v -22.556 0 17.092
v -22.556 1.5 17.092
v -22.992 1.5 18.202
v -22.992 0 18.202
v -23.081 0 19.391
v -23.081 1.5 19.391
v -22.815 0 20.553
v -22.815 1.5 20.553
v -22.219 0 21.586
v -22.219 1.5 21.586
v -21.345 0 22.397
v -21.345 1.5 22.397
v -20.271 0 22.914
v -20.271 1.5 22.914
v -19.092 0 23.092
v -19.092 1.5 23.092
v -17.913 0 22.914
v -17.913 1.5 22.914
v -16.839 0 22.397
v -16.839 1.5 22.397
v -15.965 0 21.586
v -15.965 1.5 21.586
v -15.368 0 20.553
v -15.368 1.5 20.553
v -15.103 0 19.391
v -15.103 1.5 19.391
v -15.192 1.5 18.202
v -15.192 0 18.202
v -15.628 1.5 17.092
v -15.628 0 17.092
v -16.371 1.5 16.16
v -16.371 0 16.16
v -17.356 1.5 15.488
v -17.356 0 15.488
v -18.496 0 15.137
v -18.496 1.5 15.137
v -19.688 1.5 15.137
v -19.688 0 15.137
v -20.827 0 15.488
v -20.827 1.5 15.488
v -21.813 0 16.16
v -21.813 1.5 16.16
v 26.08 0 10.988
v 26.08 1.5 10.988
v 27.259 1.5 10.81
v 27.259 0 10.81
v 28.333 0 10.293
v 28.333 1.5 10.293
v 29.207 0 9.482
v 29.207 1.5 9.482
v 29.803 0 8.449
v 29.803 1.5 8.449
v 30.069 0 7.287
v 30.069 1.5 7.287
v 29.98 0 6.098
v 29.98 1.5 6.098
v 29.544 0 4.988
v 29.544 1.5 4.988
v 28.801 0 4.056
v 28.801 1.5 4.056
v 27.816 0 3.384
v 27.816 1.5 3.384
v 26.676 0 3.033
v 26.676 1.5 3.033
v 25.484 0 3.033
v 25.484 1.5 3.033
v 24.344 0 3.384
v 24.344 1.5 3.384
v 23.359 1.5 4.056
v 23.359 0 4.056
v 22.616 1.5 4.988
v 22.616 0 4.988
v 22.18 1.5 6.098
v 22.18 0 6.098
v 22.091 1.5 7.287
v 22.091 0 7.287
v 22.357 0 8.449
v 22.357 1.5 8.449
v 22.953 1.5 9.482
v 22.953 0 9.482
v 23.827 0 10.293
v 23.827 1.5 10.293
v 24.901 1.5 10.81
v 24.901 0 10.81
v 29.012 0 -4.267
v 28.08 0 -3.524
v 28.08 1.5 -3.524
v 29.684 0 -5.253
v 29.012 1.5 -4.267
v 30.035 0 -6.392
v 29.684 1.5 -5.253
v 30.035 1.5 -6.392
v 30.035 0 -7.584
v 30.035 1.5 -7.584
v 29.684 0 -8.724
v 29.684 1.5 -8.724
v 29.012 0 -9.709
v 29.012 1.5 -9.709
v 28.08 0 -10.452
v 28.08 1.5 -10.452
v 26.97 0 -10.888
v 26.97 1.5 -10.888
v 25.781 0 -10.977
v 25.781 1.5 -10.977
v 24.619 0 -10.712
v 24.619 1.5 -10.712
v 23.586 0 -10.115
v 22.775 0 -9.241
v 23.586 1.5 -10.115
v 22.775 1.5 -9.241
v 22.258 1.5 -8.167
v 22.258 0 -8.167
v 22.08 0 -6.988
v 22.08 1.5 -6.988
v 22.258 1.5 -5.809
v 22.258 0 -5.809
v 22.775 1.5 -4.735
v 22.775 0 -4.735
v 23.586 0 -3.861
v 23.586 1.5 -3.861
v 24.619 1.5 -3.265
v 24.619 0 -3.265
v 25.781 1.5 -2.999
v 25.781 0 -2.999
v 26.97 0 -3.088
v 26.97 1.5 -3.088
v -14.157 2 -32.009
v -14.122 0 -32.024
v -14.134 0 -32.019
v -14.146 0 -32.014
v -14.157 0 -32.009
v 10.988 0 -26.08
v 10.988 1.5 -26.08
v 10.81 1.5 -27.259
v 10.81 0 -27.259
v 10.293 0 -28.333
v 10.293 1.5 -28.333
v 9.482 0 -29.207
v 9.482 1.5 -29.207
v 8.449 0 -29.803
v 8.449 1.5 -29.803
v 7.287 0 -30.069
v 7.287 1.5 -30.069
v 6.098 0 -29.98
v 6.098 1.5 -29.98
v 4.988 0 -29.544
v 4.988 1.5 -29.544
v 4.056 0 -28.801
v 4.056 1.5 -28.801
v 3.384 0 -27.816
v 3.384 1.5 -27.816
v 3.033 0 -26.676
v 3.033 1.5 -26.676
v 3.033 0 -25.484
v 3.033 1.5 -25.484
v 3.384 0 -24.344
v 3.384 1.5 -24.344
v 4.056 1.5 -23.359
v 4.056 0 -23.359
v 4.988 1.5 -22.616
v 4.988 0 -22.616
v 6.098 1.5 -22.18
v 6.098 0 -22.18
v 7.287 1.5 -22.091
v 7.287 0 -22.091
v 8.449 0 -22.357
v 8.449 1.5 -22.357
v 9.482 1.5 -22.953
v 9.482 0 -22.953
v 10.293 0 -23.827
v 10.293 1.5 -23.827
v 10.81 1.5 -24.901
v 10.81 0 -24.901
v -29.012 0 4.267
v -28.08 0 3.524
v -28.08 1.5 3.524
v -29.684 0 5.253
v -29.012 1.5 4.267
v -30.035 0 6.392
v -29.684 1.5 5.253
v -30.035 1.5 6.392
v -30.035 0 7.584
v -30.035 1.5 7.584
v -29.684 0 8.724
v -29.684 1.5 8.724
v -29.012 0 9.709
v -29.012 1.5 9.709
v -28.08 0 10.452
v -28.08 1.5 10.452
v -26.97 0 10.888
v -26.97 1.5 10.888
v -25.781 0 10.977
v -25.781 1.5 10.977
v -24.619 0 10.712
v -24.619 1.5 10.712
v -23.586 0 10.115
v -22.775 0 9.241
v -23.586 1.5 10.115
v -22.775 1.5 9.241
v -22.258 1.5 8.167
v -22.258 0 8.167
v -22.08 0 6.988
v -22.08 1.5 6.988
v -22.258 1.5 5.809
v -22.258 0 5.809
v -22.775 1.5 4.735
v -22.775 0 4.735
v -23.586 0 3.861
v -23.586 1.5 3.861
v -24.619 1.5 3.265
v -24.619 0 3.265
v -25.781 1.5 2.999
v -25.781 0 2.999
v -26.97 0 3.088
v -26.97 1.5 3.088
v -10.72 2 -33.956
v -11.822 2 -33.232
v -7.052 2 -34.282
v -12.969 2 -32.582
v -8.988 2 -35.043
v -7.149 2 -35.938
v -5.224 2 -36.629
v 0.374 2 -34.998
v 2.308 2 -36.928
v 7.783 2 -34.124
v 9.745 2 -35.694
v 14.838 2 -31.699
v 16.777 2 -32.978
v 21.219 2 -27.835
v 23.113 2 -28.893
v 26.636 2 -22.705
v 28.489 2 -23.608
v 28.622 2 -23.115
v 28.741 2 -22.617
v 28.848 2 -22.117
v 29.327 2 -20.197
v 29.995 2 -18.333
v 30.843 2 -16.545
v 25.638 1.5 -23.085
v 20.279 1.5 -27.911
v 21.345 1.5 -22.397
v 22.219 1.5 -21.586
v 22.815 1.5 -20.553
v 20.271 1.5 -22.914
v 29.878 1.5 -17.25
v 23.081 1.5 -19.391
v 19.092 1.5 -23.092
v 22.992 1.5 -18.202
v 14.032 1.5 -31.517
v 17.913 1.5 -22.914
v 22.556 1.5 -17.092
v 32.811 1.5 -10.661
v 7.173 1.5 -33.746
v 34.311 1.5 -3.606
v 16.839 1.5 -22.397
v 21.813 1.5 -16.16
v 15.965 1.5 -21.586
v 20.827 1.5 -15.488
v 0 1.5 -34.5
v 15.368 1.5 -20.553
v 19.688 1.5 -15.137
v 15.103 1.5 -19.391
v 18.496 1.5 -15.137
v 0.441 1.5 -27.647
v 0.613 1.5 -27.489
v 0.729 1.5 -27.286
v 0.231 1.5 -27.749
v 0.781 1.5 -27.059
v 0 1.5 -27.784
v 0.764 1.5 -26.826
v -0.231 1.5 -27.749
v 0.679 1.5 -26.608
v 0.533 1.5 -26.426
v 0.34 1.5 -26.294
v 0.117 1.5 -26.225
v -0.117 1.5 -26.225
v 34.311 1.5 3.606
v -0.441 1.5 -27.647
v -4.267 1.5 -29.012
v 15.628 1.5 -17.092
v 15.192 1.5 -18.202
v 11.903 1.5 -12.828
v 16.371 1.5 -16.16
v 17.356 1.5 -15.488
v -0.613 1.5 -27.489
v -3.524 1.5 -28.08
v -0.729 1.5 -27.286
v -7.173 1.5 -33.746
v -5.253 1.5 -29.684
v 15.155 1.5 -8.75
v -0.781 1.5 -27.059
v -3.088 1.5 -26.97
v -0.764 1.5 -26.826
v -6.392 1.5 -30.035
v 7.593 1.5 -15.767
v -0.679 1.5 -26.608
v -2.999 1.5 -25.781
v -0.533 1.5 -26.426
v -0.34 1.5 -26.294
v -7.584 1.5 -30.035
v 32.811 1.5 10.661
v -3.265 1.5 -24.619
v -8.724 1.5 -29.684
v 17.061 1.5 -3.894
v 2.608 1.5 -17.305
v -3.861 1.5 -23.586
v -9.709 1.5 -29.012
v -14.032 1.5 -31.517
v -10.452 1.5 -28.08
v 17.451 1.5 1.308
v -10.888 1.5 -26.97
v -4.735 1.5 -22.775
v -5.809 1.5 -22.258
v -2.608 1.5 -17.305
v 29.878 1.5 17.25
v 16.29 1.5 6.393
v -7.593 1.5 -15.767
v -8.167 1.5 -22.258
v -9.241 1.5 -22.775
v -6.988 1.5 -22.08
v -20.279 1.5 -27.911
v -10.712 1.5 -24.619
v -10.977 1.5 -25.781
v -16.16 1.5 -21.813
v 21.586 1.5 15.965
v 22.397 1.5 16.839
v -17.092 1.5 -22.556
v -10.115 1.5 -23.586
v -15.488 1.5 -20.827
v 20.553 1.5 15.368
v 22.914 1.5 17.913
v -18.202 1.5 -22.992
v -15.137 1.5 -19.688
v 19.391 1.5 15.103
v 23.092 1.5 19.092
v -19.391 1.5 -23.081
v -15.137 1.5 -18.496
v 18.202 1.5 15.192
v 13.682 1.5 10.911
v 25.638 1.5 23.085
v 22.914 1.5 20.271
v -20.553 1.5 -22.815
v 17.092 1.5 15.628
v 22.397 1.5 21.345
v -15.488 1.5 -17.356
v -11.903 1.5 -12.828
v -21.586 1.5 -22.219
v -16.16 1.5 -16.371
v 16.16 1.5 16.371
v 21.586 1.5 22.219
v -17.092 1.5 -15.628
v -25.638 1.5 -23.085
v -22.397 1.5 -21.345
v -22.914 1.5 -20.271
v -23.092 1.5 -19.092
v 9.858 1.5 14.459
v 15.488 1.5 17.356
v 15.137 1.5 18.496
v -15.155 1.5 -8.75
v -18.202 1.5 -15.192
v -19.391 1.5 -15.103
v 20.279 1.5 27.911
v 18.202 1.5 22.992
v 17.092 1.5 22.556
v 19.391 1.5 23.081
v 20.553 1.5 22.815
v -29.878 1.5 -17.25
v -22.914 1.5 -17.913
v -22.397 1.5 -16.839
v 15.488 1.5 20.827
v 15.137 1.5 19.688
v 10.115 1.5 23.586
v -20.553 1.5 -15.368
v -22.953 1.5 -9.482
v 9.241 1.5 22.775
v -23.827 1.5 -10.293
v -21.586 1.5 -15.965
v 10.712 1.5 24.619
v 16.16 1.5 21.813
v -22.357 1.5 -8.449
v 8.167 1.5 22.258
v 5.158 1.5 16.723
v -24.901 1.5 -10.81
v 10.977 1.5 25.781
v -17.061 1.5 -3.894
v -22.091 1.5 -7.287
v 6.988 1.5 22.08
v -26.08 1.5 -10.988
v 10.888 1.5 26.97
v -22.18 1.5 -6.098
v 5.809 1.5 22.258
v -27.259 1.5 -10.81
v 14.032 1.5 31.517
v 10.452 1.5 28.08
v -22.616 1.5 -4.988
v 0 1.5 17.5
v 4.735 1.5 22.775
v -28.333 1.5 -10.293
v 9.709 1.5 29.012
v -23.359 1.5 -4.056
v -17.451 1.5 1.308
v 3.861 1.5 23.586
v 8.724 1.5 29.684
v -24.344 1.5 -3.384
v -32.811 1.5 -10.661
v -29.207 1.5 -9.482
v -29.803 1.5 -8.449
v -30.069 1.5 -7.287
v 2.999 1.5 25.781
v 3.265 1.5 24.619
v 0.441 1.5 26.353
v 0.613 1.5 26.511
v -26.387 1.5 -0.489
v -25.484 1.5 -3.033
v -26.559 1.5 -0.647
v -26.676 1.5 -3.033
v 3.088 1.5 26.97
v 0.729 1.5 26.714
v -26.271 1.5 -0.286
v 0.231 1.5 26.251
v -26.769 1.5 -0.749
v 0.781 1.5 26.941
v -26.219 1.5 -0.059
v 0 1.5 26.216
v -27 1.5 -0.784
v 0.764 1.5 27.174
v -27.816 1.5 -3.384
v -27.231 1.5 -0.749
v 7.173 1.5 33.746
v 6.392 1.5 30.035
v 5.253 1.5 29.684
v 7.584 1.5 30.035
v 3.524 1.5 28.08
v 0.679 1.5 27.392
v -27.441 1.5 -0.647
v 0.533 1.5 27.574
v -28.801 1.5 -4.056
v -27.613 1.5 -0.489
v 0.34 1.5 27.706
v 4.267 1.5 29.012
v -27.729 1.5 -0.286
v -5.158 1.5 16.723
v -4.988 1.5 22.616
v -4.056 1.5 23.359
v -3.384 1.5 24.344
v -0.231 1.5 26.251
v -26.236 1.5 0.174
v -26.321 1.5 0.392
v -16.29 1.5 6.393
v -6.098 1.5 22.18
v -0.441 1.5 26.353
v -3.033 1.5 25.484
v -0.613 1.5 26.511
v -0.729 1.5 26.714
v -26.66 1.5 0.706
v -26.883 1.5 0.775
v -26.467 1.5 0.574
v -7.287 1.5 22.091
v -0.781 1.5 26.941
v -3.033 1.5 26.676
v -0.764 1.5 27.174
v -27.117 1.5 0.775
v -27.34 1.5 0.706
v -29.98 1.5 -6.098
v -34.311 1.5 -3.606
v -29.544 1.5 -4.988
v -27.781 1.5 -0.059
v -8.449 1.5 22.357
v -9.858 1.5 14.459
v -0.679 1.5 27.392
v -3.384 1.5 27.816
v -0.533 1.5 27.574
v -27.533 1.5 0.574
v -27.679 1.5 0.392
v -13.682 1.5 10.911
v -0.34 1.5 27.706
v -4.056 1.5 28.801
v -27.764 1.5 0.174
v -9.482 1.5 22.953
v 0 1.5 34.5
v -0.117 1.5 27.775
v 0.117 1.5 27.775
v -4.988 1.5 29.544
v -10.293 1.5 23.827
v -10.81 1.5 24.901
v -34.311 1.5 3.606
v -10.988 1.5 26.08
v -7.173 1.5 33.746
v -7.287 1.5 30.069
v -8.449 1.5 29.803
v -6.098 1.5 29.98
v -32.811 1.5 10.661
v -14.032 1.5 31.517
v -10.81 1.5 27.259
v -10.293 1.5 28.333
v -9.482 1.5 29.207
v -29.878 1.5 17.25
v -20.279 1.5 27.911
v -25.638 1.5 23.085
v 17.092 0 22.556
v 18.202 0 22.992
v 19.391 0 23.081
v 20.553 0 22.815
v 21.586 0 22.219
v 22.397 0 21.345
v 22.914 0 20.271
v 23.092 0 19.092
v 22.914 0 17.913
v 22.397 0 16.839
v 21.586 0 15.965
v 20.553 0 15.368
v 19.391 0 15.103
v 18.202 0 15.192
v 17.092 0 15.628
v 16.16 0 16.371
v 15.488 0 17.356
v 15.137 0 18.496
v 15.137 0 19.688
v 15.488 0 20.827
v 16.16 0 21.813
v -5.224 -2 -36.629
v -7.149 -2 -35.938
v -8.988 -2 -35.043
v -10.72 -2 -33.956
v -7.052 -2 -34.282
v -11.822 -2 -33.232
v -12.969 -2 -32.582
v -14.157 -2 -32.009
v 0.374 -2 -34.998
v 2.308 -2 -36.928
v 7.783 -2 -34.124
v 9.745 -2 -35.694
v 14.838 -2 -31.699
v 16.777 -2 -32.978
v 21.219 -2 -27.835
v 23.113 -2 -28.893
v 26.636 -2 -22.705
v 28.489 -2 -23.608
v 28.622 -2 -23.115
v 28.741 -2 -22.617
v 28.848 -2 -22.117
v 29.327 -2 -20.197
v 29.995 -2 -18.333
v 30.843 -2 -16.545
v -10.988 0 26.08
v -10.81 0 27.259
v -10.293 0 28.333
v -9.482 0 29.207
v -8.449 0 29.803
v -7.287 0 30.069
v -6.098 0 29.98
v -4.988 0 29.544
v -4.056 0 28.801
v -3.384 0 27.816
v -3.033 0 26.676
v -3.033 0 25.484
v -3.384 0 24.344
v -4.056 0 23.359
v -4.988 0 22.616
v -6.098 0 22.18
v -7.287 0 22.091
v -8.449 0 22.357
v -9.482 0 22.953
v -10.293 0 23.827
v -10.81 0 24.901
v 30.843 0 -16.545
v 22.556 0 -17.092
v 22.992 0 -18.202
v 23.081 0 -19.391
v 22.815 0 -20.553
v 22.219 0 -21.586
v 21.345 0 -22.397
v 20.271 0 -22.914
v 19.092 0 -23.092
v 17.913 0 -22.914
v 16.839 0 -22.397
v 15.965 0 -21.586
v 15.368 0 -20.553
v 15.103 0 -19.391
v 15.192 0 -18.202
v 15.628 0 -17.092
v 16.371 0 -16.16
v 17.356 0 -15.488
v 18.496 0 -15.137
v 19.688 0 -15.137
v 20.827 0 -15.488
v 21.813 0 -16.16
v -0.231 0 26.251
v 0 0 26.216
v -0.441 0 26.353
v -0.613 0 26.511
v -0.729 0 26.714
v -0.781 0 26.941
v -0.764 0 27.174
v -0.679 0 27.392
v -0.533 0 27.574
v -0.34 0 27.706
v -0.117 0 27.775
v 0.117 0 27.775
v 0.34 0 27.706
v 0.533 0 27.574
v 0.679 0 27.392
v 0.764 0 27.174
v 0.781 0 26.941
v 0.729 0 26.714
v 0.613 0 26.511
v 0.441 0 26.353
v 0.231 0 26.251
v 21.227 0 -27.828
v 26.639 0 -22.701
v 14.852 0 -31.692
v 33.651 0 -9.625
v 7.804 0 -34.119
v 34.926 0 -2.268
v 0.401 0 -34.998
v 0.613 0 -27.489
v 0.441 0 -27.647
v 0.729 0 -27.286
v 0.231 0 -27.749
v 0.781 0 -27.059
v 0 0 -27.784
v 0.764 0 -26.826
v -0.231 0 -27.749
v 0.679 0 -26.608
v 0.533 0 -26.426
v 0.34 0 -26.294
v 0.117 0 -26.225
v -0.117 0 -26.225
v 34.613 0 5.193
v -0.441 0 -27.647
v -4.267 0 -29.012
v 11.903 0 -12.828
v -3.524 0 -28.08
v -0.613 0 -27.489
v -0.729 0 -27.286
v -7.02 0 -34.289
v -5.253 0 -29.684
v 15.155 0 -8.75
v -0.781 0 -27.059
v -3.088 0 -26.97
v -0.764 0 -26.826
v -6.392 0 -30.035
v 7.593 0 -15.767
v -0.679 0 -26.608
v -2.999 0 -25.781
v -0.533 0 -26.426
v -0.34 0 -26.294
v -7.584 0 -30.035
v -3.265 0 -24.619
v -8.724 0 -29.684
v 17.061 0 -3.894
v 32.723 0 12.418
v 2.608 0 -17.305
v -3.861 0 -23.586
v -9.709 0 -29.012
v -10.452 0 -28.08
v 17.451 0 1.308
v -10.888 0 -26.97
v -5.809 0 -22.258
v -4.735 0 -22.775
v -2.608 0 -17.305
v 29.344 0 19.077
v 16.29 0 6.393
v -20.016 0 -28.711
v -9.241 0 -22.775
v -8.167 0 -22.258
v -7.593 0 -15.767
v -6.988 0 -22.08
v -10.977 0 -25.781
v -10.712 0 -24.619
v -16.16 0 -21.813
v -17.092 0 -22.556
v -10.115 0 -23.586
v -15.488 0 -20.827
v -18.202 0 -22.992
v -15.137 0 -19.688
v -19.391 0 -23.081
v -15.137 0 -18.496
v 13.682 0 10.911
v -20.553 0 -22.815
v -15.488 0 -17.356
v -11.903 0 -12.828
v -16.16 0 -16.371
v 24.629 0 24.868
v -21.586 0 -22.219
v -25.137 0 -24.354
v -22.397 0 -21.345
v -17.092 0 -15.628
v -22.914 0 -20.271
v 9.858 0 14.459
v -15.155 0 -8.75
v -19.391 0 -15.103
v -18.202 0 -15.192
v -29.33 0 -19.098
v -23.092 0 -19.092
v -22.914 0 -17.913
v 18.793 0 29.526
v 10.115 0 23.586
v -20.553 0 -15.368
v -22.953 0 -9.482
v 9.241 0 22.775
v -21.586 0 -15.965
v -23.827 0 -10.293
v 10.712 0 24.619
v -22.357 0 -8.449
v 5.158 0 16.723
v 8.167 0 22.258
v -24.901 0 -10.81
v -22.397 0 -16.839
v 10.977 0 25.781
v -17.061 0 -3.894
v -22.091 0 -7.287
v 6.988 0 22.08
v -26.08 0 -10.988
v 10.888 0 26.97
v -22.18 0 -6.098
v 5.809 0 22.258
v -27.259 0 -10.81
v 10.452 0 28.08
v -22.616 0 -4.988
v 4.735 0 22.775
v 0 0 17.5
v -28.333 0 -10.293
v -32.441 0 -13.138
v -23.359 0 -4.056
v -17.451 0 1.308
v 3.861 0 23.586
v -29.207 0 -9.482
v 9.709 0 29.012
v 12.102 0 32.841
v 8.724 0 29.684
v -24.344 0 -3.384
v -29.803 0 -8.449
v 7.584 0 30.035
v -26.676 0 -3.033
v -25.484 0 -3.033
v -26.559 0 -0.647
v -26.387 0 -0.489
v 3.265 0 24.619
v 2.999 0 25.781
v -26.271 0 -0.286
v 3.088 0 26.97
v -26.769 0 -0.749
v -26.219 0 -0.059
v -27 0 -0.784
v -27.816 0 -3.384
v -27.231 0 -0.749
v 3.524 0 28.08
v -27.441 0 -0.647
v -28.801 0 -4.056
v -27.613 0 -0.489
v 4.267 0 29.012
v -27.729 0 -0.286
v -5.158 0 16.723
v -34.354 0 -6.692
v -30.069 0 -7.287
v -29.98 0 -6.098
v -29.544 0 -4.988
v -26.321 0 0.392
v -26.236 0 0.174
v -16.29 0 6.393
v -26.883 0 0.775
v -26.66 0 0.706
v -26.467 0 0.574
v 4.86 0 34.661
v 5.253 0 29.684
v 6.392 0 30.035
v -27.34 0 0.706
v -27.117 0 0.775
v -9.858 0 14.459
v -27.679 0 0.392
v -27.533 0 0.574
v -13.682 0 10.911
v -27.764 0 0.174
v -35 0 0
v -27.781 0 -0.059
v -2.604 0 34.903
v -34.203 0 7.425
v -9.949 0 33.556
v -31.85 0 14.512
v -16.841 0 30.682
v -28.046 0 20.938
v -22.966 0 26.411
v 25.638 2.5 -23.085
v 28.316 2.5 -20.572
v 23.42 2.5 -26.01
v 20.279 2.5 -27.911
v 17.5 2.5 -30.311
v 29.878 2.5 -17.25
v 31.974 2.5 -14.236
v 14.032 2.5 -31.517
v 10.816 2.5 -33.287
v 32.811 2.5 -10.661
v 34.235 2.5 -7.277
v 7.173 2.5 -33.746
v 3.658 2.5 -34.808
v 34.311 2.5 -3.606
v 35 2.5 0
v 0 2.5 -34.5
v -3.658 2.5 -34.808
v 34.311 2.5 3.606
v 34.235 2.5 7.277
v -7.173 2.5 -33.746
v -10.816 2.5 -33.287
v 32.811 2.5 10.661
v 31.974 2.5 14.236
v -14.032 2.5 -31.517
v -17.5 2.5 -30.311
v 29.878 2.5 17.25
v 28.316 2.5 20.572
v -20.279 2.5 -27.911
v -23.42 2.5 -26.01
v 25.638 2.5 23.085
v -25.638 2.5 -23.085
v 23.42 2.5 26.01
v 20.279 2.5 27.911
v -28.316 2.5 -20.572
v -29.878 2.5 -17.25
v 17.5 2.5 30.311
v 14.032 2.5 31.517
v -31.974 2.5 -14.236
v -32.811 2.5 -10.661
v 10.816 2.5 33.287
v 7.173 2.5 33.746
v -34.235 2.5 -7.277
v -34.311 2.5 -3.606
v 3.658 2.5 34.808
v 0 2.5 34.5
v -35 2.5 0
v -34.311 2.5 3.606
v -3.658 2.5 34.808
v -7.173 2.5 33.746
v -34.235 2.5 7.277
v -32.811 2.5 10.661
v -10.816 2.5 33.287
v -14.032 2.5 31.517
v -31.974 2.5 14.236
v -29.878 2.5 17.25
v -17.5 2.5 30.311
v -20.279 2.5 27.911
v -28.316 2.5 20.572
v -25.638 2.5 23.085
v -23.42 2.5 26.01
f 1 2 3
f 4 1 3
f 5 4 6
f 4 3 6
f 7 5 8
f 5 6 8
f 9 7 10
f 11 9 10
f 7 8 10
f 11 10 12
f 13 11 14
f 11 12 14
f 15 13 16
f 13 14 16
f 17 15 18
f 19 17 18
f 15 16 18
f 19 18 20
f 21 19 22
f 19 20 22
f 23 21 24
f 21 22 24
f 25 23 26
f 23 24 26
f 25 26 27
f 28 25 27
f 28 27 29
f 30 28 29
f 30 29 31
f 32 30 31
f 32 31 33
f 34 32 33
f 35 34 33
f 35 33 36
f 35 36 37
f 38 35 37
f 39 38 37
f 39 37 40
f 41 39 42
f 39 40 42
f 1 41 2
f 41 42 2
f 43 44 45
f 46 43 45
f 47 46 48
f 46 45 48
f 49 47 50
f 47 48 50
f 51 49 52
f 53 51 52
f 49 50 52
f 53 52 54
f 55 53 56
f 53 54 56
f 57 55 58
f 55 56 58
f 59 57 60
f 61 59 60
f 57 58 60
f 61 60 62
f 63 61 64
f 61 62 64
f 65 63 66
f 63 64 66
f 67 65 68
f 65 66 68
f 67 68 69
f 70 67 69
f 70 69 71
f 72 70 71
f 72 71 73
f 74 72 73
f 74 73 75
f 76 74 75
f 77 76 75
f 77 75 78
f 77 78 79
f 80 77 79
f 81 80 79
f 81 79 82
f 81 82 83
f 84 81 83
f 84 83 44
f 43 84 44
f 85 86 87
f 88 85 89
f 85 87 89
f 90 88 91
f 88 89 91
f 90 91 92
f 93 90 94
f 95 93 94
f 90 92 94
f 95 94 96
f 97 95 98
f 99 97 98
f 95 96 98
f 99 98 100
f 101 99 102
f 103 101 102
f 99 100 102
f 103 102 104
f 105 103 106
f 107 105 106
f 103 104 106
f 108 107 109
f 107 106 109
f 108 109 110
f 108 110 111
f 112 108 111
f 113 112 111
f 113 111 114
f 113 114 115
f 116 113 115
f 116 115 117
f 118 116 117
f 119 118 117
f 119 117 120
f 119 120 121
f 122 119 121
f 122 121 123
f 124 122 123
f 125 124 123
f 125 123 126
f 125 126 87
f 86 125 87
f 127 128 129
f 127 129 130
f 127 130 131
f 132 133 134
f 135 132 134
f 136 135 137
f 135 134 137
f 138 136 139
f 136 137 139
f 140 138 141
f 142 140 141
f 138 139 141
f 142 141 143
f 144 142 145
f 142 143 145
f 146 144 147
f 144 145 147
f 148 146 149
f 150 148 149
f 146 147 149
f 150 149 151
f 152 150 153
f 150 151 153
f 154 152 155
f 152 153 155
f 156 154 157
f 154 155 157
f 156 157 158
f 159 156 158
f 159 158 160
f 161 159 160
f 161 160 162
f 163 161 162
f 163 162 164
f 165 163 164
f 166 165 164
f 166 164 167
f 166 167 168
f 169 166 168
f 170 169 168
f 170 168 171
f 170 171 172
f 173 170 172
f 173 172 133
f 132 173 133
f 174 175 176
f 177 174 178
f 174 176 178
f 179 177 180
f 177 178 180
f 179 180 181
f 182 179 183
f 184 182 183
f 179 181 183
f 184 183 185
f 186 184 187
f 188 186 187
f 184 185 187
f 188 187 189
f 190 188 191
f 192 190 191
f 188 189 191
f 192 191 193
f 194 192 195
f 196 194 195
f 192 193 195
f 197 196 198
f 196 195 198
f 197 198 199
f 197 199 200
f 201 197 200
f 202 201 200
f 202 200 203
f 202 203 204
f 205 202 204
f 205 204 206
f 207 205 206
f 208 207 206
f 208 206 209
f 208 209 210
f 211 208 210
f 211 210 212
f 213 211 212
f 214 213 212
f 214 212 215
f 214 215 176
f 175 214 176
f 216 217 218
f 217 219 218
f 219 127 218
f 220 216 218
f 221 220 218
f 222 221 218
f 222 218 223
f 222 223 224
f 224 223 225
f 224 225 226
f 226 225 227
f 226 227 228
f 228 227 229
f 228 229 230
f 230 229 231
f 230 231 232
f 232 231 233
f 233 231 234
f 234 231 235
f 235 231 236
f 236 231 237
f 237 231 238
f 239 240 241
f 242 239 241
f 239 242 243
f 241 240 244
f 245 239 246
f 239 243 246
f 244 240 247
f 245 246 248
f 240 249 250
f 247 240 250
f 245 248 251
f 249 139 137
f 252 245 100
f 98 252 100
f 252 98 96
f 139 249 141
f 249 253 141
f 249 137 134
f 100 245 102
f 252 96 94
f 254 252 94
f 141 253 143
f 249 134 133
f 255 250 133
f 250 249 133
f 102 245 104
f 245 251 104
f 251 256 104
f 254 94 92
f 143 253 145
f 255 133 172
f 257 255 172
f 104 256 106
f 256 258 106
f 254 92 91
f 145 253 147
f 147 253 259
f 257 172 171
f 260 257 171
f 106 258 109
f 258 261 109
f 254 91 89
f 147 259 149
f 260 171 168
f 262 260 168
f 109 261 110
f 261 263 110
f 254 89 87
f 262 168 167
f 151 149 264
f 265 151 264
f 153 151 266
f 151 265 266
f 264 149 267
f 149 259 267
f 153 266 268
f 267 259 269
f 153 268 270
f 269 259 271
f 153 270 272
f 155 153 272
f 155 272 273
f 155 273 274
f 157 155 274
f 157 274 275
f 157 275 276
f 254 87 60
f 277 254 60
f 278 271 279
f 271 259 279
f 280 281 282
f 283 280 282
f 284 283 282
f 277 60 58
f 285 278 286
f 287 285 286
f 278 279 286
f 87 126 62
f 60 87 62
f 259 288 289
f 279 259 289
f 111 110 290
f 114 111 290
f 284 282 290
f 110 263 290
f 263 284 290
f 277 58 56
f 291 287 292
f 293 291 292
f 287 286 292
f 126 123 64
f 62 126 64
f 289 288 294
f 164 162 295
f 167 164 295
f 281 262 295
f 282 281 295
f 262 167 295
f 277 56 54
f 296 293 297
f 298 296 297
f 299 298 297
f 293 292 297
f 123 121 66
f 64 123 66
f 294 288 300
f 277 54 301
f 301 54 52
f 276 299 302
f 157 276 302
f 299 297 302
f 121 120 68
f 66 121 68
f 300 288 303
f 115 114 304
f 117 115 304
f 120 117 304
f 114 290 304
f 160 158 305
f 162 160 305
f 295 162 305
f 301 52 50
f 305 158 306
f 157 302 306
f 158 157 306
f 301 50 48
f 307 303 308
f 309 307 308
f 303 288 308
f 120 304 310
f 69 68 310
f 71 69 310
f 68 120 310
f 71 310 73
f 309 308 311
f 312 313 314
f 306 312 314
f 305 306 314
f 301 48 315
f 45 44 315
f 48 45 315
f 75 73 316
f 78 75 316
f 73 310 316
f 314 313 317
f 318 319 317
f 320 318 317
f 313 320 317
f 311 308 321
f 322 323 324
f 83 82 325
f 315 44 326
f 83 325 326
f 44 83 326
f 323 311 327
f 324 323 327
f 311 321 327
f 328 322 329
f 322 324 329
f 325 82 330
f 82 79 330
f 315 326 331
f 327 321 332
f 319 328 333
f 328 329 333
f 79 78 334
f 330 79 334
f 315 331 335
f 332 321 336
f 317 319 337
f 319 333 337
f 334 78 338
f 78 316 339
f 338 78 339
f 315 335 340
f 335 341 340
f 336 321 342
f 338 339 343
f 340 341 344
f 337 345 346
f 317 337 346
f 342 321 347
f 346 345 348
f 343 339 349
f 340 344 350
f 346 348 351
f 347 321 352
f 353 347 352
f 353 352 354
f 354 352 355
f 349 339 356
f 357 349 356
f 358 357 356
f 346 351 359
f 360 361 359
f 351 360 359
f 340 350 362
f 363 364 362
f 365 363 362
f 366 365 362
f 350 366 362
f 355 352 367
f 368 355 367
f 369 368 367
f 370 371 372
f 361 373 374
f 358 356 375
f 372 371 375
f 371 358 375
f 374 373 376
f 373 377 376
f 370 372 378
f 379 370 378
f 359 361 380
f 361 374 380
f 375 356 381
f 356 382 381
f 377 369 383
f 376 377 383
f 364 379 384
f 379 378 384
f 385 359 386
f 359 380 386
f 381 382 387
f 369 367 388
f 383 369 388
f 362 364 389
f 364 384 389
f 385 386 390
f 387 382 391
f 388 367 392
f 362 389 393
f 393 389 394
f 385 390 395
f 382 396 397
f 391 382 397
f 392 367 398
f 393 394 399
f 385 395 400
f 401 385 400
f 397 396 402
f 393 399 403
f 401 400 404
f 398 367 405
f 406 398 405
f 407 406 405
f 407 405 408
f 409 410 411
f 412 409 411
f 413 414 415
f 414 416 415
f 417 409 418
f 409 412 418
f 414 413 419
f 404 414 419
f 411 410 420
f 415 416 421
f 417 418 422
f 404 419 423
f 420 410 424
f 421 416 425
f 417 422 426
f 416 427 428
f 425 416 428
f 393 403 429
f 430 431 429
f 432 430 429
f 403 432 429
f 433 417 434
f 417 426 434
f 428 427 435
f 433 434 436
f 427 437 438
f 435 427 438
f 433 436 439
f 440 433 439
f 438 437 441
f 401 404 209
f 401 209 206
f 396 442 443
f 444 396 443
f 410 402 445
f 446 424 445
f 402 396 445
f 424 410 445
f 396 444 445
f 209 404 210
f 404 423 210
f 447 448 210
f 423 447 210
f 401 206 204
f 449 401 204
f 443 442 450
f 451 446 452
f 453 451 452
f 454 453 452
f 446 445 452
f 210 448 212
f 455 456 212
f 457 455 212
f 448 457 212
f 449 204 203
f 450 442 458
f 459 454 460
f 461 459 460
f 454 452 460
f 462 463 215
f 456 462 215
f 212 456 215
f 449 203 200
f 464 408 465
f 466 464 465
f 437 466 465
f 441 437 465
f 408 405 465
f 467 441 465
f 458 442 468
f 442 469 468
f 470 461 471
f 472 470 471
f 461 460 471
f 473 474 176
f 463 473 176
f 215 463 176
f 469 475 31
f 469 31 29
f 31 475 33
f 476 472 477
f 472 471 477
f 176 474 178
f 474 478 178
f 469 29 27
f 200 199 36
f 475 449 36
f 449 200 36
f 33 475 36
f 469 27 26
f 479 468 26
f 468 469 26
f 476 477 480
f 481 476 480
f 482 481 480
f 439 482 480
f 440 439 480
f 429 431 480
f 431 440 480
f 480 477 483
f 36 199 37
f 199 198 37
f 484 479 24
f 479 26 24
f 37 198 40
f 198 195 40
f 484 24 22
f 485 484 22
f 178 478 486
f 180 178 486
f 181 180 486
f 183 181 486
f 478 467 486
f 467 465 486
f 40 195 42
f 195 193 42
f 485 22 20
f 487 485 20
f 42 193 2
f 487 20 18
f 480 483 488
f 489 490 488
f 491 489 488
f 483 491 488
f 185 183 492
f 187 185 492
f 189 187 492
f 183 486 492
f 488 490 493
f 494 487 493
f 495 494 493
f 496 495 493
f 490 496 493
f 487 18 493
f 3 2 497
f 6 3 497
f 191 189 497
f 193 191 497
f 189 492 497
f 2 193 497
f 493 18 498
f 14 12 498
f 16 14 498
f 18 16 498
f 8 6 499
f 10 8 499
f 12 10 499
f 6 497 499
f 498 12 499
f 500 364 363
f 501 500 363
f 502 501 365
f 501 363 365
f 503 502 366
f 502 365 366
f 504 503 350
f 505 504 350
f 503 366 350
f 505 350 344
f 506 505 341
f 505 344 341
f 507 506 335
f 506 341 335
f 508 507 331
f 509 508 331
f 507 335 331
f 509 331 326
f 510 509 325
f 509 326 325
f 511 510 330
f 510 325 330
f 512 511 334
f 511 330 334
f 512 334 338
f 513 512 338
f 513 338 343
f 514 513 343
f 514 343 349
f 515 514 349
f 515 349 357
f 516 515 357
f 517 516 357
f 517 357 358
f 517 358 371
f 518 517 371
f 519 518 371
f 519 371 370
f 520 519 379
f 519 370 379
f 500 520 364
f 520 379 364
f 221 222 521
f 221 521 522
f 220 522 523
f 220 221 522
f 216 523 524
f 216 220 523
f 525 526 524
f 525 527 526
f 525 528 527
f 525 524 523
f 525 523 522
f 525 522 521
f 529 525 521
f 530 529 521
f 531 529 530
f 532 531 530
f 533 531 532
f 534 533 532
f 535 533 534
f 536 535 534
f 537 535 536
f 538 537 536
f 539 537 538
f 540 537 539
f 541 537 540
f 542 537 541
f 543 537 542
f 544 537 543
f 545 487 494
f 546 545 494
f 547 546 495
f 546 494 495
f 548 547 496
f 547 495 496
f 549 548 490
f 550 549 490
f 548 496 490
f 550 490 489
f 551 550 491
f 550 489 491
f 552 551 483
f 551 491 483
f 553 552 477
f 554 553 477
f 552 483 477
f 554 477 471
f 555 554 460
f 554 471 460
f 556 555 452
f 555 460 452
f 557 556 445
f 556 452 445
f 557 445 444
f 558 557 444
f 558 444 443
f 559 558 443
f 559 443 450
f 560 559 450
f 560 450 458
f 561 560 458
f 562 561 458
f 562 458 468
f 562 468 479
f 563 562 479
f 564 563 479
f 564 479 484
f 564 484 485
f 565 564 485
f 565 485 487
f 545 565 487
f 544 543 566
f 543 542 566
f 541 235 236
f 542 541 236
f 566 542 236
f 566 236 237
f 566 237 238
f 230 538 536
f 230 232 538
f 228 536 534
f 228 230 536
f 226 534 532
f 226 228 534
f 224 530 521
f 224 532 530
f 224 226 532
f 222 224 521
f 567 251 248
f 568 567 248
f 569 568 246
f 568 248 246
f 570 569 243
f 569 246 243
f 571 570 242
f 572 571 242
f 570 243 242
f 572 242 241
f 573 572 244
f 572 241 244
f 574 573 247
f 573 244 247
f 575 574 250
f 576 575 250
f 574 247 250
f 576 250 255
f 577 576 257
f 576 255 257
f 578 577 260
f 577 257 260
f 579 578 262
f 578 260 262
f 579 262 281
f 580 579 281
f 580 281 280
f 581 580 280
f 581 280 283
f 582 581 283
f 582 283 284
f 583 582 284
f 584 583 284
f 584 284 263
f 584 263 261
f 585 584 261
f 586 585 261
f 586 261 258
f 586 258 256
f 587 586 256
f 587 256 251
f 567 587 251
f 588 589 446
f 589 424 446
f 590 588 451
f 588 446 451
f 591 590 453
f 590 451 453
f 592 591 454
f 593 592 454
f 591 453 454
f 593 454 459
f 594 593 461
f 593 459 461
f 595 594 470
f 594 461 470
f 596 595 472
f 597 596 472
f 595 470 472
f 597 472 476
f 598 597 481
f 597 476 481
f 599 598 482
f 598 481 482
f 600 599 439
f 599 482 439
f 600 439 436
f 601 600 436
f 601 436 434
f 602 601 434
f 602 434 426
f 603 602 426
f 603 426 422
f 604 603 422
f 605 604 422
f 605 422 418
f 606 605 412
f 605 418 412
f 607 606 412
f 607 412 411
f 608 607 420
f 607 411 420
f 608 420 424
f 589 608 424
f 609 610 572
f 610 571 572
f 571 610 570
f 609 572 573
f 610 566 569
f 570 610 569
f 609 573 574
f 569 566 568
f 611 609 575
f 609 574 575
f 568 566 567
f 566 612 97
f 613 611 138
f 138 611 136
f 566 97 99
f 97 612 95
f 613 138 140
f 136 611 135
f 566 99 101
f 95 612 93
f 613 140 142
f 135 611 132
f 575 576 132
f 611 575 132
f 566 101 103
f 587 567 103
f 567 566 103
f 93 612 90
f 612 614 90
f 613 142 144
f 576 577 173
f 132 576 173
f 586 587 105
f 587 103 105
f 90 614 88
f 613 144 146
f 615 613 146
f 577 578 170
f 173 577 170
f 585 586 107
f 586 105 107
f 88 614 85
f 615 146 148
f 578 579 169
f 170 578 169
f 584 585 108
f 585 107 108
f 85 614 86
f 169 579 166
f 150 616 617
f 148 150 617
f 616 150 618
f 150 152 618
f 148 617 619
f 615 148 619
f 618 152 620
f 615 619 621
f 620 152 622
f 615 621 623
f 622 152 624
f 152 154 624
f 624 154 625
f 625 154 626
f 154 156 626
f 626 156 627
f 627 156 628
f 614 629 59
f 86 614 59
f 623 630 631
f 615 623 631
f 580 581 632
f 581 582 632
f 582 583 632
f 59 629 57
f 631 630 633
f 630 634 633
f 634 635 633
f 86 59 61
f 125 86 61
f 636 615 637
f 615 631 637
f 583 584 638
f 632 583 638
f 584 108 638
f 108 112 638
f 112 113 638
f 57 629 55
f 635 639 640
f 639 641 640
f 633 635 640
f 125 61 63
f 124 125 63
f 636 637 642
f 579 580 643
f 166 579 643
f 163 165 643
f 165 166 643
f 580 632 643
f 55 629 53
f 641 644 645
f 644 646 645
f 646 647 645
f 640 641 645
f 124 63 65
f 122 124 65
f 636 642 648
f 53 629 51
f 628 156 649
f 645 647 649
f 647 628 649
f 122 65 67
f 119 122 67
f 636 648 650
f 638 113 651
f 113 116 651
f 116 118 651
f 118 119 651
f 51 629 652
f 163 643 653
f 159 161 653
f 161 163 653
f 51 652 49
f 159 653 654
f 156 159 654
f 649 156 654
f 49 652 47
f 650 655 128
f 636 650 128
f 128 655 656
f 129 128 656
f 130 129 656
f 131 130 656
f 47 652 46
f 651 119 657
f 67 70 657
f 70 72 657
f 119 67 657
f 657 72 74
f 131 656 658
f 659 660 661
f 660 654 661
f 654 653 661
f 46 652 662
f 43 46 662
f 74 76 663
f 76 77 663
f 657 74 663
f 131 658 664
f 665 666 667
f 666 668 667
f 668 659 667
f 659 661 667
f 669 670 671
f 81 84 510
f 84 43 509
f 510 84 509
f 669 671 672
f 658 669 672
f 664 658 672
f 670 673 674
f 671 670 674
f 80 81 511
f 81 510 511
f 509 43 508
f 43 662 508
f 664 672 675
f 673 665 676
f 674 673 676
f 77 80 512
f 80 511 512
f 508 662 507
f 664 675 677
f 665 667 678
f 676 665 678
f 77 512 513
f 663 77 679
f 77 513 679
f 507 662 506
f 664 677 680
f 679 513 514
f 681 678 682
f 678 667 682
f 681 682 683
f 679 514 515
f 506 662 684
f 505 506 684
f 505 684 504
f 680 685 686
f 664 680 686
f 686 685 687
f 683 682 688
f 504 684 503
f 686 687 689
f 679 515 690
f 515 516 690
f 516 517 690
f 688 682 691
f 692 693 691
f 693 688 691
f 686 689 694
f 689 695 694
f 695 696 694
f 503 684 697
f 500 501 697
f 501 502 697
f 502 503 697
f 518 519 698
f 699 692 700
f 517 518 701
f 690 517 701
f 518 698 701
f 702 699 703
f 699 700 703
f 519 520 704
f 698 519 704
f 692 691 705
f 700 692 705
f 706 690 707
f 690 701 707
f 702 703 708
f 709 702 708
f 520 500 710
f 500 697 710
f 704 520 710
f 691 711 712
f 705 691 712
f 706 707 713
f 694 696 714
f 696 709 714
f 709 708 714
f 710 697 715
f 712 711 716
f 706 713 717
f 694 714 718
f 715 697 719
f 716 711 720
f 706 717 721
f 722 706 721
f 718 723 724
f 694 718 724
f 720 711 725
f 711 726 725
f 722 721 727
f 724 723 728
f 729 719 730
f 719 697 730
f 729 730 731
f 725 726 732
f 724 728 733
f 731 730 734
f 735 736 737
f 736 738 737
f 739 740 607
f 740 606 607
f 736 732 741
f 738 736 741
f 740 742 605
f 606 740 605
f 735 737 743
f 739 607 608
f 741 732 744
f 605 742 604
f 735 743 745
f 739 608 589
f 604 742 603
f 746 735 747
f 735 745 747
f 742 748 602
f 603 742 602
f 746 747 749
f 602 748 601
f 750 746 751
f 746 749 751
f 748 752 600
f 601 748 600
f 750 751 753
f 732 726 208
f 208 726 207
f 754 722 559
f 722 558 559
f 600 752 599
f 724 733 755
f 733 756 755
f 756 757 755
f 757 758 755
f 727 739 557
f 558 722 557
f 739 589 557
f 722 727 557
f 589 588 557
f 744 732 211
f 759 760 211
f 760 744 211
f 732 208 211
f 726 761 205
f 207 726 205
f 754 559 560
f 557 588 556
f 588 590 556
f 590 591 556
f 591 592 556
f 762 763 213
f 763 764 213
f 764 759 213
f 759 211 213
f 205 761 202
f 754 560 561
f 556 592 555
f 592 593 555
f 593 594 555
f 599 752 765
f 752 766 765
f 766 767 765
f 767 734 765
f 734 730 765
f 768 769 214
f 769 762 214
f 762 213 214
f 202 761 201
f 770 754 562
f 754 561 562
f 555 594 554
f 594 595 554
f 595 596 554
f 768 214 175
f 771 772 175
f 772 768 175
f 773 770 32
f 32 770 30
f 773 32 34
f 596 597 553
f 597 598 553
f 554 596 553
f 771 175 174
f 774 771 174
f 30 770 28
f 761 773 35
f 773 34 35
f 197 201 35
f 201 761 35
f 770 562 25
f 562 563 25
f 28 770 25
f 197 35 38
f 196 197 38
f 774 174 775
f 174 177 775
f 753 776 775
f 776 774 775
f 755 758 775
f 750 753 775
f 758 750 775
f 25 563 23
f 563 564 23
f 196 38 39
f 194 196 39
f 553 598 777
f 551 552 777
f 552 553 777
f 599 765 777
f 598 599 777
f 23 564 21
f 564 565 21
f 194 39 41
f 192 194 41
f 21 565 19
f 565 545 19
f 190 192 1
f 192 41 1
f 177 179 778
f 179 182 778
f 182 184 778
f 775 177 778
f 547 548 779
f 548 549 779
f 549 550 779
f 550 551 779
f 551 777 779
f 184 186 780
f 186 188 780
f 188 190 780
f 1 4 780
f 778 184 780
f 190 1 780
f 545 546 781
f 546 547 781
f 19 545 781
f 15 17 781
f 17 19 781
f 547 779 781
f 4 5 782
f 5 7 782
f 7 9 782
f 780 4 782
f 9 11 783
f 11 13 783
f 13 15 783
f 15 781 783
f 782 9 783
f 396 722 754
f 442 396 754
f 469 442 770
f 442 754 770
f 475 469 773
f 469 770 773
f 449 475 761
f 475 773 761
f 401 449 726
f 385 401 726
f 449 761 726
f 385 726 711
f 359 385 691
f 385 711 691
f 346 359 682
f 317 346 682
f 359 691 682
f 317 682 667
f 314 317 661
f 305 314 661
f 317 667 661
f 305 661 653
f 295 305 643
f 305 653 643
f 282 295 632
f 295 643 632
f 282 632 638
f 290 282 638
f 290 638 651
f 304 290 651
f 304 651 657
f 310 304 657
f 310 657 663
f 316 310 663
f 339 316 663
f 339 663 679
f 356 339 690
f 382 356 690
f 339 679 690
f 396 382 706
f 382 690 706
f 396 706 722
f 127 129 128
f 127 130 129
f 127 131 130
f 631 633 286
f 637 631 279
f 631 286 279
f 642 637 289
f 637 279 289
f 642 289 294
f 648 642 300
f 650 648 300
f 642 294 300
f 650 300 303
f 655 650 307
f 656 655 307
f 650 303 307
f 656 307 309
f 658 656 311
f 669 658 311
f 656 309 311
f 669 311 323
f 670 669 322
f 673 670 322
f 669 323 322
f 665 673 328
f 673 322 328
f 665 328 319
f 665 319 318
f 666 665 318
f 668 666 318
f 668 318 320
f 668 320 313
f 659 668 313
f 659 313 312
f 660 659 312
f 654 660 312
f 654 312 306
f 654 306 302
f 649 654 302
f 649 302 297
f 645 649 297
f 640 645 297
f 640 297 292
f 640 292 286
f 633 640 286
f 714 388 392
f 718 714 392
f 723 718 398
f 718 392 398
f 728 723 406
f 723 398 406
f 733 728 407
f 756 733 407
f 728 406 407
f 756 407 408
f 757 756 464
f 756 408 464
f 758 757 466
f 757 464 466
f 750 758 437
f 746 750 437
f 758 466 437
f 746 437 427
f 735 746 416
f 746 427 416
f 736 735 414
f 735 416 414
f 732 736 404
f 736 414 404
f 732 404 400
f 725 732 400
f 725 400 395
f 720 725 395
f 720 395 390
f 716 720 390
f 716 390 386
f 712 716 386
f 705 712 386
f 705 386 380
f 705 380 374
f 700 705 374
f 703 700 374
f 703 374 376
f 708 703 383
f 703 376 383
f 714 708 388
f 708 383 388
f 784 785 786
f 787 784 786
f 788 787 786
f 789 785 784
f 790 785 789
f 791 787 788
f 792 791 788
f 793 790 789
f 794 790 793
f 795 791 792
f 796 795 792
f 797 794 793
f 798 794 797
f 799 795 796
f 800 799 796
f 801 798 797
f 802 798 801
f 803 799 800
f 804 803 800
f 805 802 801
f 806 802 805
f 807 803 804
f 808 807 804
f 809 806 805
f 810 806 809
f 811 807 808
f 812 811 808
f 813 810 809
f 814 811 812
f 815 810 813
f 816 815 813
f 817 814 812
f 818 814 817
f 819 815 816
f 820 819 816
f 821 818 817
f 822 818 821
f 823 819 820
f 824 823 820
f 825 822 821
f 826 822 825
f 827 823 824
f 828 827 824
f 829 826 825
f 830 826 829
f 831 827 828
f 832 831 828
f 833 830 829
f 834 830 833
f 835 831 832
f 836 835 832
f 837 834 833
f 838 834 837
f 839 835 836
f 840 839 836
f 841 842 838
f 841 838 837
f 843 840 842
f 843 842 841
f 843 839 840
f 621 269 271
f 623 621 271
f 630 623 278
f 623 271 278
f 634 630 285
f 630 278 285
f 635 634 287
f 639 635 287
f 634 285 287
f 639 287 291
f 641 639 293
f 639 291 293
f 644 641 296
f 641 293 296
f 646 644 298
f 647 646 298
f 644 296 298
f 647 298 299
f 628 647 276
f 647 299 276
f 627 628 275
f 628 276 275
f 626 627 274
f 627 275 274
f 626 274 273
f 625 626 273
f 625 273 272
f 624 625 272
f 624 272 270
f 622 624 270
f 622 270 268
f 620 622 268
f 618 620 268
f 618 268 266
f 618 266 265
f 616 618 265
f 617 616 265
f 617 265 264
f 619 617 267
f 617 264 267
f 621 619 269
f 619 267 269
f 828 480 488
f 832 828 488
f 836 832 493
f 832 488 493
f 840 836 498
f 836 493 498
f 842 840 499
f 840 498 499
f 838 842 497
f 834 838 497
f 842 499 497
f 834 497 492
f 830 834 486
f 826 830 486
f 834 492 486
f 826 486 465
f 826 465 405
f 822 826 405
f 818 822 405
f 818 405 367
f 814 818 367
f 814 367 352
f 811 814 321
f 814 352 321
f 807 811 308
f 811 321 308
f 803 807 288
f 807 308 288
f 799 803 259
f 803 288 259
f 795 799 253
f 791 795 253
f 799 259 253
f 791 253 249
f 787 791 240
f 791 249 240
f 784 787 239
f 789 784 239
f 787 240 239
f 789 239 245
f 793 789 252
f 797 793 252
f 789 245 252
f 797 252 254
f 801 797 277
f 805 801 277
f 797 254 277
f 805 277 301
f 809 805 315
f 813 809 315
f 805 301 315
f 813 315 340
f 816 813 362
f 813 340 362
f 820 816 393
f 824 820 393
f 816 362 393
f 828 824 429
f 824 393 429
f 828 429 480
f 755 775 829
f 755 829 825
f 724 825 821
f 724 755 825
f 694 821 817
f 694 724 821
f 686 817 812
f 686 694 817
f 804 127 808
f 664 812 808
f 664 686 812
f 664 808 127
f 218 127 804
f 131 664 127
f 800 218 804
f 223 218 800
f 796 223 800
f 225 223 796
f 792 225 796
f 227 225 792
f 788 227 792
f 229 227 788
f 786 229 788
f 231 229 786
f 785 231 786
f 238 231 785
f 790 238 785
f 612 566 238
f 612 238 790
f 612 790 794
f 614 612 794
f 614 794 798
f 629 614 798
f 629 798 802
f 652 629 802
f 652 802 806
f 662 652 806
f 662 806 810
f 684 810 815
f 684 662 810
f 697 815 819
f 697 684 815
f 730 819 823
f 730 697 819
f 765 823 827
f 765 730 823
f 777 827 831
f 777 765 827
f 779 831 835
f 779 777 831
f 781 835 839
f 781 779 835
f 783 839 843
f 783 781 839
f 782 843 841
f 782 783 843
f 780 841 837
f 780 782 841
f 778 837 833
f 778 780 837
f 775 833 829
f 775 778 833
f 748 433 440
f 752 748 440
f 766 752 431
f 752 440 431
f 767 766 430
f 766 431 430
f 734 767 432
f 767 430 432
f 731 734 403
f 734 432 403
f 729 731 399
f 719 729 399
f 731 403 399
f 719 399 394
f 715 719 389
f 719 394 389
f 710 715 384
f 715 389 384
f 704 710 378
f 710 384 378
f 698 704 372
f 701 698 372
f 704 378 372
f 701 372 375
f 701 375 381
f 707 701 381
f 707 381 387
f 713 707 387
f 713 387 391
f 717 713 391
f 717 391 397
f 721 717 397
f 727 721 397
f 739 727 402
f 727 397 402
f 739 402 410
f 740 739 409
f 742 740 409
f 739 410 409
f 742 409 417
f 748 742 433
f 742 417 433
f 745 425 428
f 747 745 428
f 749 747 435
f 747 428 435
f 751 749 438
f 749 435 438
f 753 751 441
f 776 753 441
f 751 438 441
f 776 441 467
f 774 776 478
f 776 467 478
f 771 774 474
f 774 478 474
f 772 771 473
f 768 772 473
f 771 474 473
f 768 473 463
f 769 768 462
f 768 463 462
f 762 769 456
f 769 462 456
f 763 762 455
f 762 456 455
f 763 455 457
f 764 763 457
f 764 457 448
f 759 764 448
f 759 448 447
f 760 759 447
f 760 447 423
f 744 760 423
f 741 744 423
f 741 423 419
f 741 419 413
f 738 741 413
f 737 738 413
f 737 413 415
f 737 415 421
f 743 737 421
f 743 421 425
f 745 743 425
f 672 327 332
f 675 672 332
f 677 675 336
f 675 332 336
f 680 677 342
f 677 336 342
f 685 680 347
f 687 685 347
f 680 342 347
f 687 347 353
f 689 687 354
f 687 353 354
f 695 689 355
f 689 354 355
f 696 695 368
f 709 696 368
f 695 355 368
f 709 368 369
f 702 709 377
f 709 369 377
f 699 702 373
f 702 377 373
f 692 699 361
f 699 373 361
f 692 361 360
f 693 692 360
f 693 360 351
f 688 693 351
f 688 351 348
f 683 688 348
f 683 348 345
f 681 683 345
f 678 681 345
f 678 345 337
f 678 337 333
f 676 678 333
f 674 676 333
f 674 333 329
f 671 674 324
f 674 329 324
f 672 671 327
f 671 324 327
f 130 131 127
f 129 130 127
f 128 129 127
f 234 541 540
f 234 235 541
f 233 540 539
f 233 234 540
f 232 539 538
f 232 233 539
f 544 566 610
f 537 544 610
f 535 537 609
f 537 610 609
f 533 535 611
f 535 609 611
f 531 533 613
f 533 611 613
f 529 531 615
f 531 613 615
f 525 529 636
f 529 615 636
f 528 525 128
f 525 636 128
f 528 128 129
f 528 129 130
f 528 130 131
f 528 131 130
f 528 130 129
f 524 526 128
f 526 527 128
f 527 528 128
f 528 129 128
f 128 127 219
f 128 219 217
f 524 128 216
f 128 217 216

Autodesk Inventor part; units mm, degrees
ref_plane "YZ Plane" through (0, 0, 0) normal (1, 0, 0) x (0, 1, 0)
ref_plane "XZ Plane" through (0, 0, 0) normal (0, 1, 0) x (-1, 0, 0)
ref_plane "XY Plane" through (0, 0, 0) normal (0, 0, 1) x (1, 0, 0)
sketch "Skizze1" plane through (0, 0, 0) normal (0, 1, 0) x (-1, 0, 0)
  circle A0 centre (0, 0) radius 35
  dimension "d7" = 70
extrude "Extrusion1" add sketch "Skizze1" along normal blind 2.5
sketch "Skizze3" plane through (0, 2.5, 0) normal (0, 1, 0) x (1, 0, 0)
  circle A0 centre (0, 0) radius 35 projected
hole "Bohrung1" at (0, 2.5, 0) direction (0, -1, 0) diameter 35 depth 2.5 counterbore diameter 69 counterbore depth 1
sketch "Skizze4" plane through (0, 0, 0) normal (0, -1, 0) x (1, 0, 0)
  circle A0 centre (0, 0) radius 27 construction
  line L0 (0, 0) -> (-42.7199, -11.4468) construction
  line L1 (0, 0) -> (-46.622, 0) construction
  line L2 (0, 0) -> (-37.3681, 21.5745) construction
  point P0 (-26.08, -6.9881)
  dimension "d25" = 54
  dimension "d26" = 15
  dimension "d27" = 30
  dimension "d28" = 45
hole "Bohrung2" at (-26.08, 0, -6.9881) direction (0, 1, 0) diameter 8 end through all
pattern_circular "Runde Anordnung1" count 12 over 360 about axis through (0, -96.5265, 0) along (0, 1, 0) of "Bohrung2"
sketch "Skizze5" plane through (0, 0, 0) normal (0, -1, 0) x (1, 0, 0)
  circle A0 centre (0, 0) radius 27 construction
  line L0 (0, 0) -> (-37.3681, 21.5745) construction
  line L1 (0, 0) -> (-46.622, 0) construction
  circle A1 centre (0, 0) radius 35 projected
  line L2 (0, 0) -> (-42.7199, -11.4468) construction
  point P0 (0, -27)
  point P1 (0, 27)
  point P2 (-27, 0)
hole "Bohrung3" at (0, 0, -27) at (-27, 0, 0) at (0, 0, 27) direction (0, 1, 0) diameter 1.567 depth 1.5 thread size "M2x0.4" class "6H" standard "ISO Metric profile"
sketch "Skizze6" plane through (0, 0, 0) normal (0, -1, 0) x (1, 0, 0)
  arc A0 (-5.2244, -36.6293) -> (28.4893, -23.6085) centre (0, 0) ccw
  circle A1 centre (0, 0) radius 35 projected
  arc A2 (-10.7196, -33.956) -> (-14.1572, -32.0089) centre (-22.2471, -50.2998) ccw
  arc A3 (-10.7196, -33.956) -> (-5.2244, -36.6293) centre (0.2314, -18.4295) ccw
  arc A4 (28.4893, -23.6085) -> (28.8475, -22.117) centre (10.2088, -18.4295) ccw
  arc A5 (30.8428, -16.5446) -> (28.8475, -22.117) centre (48.4672, -25.9987) ccw
  dimension "d39" = 74
  dimension "d56" = 20
  dimension "d57" = 19
  dimension "d58" = 19
  dimension "d59" = 20
  dimension "d60" = 45
extrude "Extrusion2" add sketch "Skizze6" along normal mid plane 4 contours A3 A2 A1 A5 A4 A0
properties part number "nockenscheibe2"
